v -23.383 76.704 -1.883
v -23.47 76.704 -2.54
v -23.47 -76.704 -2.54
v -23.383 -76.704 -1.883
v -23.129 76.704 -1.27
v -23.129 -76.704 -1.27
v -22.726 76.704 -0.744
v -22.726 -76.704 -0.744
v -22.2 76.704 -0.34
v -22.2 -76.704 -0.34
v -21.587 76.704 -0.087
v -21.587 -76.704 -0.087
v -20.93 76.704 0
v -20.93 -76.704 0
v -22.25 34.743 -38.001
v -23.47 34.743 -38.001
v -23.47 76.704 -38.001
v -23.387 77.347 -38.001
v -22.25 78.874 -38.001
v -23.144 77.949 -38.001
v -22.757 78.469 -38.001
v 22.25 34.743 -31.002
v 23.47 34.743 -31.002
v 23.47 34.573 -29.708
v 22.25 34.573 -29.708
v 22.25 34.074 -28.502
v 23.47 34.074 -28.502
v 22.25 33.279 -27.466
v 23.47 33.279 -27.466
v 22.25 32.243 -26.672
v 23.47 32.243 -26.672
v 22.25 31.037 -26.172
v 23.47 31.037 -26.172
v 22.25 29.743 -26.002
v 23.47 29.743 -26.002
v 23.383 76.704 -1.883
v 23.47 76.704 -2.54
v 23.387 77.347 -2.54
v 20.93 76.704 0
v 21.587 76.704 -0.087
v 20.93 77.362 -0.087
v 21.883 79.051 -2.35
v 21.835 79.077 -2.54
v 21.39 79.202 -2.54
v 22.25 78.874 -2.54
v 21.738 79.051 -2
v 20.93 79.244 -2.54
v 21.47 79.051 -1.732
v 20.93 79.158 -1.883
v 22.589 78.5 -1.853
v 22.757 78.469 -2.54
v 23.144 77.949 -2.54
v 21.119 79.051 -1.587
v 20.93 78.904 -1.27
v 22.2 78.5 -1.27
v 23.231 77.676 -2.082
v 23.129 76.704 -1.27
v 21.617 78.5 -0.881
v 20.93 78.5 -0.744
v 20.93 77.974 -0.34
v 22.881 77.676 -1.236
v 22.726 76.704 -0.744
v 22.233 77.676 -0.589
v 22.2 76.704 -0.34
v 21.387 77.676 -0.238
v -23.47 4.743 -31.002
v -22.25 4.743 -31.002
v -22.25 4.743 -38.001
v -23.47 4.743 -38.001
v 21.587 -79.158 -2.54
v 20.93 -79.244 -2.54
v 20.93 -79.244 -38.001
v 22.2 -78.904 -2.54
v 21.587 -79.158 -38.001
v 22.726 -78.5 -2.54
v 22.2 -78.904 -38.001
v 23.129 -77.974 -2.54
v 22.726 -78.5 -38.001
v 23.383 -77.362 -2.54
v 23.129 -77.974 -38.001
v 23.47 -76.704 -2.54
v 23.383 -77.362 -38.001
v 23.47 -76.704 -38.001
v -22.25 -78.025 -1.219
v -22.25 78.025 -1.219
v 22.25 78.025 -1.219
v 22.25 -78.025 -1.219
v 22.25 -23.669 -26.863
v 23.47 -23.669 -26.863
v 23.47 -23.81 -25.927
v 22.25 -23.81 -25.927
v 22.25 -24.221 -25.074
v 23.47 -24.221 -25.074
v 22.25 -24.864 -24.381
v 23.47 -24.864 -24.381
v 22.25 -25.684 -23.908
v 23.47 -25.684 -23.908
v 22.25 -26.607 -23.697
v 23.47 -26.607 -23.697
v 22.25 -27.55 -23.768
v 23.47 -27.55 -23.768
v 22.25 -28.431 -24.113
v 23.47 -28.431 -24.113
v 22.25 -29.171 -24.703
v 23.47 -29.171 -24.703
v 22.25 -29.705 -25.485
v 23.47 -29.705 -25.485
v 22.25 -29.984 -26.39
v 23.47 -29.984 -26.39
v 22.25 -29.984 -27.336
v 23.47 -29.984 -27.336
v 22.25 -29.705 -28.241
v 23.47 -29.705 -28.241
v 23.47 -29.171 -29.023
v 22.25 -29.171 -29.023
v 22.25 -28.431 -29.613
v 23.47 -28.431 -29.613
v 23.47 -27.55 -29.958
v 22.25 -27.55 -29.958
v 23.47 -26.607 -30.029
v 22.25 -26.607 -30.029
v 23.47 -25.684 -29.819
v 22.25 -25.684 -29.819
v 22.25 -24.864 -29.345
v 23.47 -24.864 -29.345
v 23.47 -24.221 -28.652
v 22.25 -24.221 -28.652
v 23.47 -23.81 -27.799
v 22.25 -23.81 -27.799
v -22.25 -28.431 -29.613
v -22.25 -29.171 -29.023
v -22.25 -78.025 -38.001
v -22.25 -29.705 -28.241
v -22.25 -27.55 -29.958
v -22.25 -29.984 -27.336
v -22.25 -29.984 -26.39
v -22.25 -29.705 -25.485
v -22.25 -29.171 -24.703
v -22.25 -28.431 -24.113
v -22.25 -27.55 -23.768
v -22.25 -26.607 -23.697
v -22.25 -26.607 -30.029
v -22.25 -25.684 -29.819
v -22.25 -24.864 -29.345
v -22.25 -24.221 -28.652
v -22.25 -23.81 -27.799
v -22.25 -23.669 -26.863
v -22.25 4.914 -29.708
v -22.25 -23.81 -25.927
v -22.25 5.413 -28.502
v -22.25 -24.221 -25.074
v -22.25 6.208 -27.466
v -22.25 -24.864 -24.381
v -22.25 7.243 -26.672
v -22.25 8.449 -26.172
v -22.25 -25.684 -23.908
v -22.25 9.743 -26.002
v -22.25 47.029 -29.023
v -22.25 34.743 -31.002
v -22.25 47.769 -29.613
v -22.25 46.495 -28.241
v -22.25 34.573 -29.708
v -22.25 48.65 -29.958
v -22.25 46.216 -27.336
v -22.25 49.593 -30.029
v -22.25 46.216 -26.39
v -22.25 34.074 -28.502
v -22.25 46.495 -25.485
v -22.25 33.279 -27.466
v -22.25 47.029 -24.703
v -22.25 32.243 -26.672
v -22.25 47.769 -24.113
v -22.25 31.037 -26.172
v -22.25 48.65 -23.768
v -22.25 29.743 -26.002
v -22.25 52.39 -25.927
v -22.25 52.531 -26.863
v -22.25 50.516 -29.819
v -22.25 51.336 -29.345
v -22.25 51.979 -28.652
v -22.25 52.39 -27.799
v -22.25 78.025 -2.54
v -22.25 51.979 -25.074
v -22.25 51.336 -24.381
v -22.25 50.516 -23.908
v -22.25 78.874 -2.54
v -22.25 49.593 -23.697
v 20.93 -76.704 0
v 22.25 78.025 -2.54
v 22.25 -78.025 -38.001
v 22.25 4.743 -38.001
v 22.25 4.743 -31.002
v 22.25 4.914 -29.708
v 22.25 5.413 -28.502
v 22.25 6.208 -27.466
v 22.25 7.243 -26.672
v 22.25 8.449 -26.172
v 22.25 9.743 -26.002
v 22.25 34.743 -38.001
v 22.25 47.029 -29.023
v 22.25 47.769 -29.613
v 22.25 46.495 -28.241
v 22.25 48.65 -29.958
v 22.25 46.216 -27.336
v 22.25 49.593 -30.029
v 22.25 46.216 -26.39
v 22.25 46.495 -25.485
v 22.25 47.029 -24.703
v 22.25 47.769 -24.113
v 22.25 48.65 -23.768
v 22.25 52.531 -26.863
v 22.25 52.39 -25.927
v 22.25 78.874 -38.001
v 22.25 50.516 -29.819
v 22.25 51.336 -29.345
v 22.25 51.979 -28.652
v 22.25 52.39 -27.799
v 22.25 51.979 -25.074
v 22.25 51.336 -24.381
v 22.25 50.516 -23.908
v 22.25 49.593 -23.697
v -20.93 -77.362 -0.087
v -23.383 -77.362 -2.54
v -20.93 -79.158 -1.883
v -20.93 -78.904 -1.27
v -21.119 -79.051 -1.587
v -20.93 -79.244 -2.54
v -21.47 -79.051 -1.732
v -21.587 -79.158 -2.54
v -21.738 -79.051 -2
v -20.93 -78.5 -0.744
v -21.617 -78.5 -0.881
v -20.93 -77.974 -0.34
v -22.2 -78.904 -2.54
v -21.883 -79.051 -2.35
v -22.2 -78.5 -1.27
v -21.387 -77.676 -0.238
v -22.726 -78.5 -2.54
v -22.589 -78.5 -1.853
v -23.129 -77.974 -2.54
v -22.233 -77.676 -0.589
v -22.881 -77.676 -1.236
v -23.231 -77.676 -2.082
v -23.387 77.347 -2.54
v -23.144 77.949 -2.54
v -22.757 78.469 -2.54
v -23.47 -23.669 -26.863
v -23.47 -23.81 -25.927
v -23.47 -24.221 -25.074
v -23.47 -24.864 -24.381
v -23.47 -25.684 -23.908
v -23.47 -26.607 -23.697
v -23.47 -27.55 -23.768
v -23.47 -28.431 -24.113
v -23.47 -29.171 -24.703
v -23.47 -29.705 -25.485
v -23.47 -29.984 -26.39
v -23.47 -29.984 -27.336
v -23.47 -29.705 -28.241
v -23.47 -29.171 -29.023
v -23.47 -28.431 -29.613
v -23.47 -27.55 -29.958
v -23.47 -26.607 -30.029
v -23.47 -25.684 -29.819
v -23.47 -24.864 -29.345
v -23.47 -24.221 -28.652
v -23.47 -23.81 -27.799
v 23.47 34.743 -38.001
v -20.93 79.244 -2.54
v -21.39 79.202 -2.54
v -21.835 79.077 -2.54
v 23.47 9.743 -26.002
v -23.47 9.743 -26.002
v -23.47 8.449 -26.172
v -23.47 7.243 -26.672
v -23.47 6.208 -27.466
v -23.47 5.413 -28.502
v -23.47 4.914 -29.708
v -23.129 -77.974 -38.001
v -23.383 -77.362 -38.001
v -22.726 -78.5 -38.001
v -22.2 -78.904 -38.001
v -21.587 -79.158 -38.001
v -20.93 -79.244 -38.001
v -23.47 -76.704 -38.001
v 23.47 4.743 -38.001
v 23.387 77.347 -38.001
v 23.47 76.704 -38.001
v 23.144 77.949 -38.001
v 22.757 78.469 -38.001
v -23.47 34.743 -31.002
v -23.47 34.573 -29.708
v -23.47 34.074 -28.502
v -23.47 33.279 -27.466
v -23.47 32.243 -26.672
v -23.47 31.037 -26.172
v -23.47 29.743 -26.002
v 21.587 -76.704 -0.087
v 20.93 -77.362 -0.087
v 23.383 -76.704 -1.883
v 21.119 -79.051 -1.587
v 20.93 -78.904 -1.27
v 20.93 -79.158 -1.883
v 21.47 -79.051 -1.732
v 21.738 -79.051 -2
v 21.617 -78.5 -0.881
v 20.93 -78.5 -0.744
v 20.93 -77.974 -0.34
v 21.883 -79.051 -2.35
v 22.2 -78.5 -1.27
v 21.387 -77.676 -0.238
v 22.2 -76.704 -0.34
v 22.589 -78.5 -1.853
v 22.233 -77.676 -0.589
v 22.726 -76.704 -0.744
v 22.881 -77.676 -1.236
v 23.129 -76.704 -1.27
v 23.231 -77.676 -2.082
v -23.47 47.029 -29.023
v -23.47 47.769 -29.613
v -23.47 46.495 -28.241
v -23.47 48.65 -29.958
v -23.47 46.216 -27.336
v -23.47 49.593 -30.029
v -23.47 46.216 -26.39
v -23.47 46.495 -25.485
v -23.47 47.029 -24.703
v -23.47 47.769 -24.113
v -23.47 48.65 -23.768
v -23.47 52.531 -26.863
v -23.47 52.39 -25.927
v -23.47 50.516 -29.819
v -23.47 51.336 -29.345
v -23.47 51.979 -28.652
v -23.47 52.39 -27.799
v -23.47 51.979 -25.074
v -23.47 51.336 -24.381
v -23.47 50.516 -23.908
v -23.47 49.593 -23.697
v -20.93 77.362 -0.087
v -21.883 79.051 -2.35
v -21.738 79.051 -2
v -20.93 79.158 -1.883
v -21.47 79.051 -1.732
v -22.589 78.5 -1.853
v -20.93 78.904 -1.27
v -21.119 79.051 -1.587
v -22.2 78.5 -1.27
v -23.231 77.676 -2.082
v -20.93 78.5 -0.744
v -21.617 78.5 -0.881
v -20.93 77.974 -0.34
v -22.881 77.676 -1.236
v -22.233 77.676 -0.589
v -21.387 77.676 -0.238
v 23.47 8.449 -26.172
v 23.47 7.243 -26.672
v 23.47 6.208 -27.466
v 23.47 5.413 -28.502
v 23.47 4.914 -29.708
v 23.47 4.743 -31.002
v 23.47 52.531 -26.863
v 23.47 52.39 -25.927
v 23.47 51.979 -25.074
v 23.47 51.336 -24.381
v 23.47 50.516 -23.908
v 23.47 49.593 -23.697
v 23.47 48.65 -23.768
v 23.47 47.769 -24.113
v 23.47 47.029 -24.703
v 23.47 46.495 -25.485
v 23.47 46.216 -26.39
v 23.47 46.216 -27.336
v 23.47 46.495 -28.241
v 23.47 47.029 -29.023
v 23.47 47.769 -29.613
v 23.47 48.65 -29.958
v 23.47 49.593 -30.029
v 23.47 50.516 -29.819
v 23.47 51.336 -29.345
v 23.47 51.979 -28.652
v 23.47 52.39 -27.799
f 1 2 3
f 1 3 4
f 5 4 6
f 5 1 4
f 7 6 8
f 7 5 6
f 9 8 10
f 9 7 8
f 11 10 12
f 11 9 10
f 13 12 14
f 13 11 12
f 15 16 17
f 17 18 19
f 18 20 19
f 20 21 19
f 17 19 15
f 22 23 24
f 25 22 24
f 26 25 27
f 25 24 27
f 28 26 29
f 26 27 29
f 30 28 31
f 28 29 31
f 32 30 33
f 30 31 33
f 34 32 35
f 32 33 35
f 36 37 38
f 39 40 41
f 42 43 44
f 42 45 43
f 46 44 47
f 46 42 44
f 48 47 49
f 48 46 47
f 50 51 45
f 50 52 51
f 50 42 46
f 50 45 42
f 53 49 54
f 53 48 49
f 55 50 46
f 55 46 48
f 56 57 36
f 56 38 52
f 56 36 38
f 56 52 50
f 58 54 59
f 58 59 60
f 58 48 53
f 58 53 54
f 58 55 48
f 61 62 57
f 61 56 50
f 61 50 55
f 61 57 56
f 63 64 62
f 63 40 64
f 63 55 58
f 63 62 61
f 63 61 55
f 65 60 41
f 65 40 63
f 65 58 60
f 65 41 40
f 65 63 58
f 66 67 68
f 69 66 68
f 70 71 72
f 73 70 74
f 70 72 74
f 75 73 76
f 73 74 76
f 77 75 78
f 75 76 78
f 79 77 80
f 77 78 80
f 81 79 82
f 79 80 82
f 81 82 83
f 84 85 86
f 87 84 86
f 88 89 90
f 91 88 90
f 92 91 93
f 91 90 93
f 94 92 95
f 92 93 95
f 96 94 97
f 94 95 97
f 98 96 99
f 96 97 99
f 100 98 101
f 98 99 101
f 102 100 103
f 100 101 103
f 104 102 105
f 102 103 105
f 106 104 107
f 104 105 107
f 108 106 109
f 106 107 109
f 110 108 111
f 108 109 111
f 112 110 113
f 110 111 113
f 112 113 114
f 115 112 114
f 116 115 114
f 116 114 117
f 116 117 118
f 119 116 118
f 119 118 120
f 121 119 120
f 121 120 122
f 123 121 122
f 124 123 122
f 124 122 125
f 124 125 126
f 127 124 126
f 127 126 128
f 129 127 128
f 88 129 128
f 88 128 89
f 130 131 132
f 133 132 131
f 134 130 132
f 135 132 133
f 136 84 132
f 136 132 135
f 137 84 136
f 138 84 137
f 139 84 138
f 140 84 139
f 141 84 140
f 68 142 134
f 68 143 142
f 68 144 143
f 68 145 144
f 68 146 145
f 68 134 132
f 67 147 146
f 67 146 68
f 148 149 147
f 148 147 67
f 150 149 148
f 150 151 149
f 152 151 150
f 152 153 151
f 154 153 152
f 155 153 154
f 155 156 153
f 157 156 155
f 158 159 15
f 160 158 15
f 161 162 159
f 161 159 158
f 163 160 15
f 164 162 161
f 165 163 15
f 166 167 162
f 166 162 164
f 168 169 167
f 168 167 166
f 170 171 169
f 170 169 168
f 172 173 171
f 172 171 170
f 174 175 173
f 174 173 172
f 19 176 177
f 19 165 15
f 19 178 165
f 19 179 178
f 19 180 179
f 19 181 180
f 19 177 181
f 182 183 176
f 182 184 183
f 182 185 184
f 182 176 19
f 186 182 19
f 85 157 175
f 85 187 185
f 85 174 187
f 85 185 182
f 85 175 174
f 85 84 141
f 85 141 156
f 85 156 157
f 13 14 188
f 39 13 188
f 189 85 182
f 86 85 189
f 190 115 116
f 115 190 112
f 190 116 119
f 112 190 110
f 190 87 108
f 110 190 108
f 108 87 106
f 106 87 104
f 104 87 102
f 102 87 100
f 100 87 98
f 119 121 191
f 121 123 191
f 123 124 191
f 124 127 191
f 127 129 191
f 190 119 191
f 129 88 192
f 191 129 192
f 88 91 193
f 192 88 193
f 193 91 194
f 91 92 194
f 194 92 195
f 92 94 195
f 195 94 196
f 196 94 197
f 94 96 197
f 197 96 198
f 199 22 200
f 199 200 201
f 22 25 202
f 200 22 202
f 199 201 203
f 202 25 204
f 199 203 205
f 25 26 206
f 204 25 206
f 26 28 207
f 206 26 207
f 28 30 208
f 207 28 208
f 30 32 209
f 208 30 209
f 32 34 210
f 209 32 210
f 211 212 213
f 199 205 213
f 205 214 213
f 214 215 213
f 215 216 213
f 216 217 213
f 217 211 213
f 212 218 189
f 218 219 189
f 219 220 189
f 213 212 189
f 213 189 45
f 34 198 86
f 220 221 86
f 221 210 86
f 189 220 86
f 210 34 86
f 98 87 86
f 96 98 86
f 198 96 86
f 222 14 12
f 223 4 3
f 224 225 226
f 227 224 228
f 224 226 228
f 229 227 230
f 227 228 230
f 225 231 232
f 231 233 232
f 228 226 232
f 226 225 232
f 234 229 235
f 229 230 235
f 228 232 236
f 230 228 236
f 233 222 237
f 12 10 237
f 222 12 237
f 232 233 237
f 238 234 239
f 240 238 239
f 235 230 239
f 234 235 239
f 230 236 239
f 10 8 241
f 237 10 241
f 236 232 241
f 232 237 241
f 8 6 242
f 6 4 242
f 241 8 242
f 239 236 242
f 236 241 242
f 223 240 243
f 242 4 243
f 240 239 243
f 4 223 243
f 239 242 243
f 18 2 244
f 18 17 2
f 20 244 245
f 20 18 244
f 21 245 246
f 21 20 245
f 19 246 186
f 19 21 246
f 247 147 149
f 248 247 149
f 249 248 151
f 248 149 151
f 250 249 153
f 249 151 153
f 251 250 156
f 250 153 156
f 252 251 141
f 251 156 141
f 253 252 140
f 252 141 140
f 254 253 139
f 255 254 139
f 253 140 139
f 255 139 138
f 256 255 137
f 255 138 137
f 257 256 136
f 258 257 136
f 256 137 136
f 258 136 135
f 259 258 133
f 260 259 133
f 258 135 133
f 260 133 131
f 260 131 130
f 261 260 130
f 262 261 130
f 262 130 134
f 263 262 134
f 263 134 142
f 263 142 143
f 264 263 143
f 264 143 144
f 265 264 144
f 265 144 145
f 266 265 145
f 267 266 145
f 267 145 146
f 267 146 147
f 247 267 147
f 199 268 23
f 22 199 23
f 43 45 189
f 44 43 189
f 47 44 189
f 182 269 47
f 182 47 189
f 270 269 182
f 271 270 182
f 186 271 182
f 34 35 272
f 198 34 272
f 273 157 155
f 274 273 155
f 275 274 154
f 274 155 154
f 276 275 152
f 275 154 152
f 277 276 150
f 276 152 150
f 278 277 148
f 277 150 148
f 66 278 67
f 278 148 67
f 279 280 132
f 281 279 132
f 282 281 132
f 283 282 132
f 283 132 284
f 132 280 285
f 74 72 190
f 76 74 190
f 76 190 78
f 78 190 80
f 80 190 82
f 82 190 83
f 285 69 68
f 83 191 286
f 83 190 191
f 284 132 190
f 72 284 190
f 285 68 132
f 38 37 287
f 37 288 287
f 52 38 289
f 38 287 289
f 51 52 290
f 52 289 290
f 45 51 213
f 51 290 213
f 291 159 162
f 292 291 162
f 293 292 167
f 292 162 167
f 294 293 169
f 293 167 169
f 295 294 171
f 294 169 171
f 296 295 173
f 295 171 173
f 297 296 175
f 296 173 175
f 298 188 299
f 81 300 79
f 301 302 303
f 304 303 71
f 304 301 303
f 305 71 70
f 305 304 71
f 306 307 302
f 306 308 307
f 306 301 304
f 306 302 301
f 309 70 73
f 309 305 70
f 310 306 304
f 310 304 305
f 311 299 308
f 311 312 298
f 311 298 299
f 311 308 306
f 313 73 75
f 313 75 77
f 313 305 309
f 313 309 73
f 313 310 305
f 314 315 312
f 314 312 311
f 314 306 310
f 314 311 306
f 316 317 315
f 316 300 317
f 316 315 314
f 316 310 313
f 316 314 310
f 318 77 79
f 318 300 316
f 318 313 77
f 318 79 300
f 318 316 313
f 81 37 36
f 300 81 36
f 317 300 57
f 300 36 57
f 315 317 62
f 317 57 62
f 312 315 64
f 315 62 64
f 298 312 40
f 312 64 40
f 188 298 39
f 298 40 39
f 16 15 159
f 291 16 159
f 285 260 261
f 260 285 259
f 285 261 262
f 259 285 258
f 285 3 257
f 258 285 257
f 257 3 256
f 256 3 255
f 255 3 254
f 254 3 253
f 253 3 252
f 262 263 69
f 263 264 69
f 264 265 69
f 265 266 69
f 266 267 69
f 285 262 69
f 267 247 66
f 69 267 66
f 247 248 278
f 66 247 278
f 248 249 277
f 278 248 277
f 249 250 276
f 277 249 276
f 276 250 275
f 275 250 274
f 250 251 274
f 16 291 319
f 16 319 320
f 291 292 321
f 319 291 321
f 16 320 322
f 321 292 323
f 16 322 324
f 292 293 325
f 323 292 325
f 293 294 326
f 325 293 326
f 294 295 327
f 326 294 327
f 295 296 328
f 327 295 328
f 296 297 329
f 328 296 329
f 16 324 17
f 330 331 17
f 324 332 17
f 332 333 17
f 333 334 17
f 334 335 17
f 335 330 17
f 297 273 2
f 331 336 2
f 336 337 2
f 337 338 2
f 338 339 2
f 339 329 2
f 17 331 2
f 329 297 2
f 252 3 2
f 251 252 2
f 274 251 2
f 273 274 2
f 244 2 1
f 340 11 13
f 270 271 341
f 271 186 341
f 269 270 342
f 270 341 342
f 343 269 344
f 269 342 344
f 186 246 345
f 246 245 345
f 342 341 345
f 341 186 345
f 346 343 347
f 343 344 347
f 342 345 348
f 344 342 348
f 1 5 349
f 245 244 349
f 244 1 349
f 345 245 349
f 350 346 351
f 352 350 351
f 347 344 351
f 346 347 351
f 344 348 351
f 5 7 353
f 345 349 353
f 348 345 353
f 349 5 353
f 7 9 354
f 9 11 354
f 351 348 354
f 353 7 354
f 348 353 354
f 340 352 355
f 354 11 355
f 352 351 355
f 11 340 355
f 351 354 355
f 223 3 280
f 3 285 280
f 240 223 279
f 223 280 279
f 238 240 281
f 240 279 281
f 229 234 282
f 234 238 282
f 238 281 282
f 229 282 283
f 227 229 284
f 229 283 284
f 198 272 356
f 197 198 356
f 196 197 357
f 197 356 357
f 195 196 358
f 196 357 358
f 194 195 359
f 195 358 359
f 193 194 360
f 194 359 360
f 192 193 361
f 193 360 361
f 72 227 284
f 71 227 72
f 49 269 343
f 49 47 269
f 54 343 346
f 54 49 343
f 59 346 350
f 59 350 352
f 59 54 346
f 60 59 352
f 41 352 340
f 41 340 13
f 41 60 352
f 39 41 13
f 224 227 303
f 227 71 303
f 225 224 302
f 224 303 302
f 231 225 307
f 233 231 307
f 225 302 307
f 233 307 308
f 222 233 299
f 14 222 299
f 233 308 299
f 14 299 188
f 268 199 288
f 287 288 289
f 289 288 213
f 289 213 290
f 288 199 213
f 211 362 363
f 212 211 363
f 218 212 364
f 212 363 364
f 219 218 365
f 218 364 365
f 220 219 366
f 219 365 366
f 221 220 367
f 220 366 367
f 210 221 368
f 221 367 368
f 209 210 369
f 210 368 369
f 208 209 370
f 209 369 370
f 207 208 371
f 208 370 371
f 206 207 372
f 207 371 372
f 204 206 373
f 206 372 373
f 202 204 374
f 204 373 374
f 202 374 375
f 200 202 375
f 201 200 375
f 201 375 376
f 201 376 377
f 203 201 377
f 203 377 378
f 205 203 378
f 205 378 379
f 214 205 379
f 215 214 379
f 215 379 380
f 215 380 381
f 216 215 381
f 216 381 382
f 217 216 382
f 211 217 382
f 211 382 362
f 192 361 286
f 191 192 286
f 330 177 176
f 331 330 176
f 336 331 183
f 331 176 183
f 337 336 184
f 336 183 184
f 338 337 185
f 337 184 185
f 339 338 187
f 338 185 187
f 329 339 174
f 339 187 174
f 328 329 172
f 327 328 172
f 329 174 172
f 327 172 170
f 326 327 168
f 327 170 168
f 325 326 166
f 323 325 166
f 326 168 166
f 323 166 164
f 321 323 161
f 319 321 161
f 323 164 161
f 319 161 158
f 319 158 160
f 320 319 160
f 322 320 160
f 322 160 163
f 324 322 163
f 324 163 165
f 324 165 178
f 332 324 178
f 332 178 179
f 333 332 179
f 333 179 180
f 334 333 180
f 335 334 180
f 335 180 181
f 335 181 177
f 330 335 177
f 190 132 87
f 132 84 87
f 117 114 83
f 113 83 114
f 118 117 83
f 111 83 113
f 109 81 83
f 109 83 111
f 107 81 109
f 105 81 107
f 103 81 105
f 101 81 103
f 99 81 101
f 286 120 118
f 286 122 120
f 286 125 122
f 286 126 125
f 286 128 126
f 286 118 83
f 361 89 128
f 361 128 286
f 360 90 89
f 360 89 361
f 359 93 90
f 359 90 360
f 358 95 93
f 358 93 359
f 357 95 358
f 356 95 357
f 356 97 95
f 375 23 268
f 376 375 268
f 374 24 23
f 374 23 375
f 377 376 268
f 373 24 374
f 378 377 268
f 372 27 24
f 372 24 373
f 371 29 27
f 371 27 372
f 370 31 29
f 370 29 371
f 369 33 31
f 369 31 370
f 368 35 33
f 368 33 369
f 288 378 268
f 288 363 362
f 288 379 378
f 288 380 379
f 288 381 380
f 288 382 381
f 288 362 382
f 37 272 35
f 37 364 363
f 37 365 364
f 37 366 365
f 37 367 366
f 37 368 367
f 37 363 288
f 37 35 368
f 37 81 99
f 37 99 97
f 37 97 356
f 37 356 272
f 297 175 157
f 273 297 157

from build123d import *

# Parameters (mm, degrees)
F0_W     = 46.9392
F0_H     = 158.48838
F1_DEPTH = 38.00094
F2_T     = -1.2192
F3_R     = 2.54
F5_DEPTH = 46.9402
F6_R     = 3.175
F7_DEPTH = 46.9402
F8_W     = 44.5008
F8_H     = 35.46094
F9_DEPTH = 1.2192


with BuildPart() as f1:
    # F0 (on Top) → F1 (new body)
    with BuildSketch(Plane.XY):
        Rectangle(F0_W, F0_H)
    extrude(amount=-F1_DEPTH)

    # F2
    f2_openings = [f1.faces().sort_by_distance(p)[0] for p in [
        (0, 0, -38.00094),
    ]]
    offset(amount=F2_T, openings=f2_openings)

    # F3
    f3_edges = [f1.edges().sort_by_distance(p)[0] for p in [
        (23.4696, 0, 0),
        (-23.4696, 0, 0),
        (0, -79.24419, 0),
        (23.4696, -79.24419, -19.00047),
        (-23.4696, -79.24419, -19.00047),
        (-23.4696, 79.24419, -19.00047),
        (23.4696, 79.24419, -19.00047),
        (0, 79.24419, 0),
    ]]
    fillet(f3_edges, radius=F3_R)

    # F4 (on face) → F5 (cut, through all)
    with BuildSketch(Plane.YZ.offset(23.4696)):
        with BuildLine():
            Line((4.74345, -38.00094), (34.74339, -38.00094))
            Line((34.74339, -38.00094), (34.74339, -31.00197))
            ThreePointArc((34.74339, -31.00197), (33.278927, -27.466443), (29.7434, -26.00198))
            Line((29.7434, -26.00198), (9.74344, -26.00198))
            ThreePointArc((9.74344, -26.00198), (6.207913, -27.466443), (4.74345, -31.00197))
            Line((4.74345, -31.00197), (4.74345, -38.00094))
        make_face()
    extrude(amount=-F5_DEPTH, mode=Mode.SUBTRACT)

    # F6 (on face) → F7 (cut, through all)
    with BuildSketch(Plane.YZ.offset(23.4696)):
        with Locations((-26.84399, -26.86304)):
            Circle(F6_R)
        with Locations((49.35601, -26.86304)):
            Circle(F6_R)
    extrude(amount=-F7_DEPTH, mode=Mode.SUBTRACT)

    # F8 (on face) → F9 (cut, through all)
    with BuildSketch(Plane(origin=(0, 79.24419, 0), x_dir=(-1, 0, 0), z_dir=(0, 1, 0))):
        with Locations((0, -20.27047)):
            Rectangle(F8_W, F8_H)
    extrude(amount=-F9_DEPTH, mode=Mode.SUBTRACT)


solid = f1.part
